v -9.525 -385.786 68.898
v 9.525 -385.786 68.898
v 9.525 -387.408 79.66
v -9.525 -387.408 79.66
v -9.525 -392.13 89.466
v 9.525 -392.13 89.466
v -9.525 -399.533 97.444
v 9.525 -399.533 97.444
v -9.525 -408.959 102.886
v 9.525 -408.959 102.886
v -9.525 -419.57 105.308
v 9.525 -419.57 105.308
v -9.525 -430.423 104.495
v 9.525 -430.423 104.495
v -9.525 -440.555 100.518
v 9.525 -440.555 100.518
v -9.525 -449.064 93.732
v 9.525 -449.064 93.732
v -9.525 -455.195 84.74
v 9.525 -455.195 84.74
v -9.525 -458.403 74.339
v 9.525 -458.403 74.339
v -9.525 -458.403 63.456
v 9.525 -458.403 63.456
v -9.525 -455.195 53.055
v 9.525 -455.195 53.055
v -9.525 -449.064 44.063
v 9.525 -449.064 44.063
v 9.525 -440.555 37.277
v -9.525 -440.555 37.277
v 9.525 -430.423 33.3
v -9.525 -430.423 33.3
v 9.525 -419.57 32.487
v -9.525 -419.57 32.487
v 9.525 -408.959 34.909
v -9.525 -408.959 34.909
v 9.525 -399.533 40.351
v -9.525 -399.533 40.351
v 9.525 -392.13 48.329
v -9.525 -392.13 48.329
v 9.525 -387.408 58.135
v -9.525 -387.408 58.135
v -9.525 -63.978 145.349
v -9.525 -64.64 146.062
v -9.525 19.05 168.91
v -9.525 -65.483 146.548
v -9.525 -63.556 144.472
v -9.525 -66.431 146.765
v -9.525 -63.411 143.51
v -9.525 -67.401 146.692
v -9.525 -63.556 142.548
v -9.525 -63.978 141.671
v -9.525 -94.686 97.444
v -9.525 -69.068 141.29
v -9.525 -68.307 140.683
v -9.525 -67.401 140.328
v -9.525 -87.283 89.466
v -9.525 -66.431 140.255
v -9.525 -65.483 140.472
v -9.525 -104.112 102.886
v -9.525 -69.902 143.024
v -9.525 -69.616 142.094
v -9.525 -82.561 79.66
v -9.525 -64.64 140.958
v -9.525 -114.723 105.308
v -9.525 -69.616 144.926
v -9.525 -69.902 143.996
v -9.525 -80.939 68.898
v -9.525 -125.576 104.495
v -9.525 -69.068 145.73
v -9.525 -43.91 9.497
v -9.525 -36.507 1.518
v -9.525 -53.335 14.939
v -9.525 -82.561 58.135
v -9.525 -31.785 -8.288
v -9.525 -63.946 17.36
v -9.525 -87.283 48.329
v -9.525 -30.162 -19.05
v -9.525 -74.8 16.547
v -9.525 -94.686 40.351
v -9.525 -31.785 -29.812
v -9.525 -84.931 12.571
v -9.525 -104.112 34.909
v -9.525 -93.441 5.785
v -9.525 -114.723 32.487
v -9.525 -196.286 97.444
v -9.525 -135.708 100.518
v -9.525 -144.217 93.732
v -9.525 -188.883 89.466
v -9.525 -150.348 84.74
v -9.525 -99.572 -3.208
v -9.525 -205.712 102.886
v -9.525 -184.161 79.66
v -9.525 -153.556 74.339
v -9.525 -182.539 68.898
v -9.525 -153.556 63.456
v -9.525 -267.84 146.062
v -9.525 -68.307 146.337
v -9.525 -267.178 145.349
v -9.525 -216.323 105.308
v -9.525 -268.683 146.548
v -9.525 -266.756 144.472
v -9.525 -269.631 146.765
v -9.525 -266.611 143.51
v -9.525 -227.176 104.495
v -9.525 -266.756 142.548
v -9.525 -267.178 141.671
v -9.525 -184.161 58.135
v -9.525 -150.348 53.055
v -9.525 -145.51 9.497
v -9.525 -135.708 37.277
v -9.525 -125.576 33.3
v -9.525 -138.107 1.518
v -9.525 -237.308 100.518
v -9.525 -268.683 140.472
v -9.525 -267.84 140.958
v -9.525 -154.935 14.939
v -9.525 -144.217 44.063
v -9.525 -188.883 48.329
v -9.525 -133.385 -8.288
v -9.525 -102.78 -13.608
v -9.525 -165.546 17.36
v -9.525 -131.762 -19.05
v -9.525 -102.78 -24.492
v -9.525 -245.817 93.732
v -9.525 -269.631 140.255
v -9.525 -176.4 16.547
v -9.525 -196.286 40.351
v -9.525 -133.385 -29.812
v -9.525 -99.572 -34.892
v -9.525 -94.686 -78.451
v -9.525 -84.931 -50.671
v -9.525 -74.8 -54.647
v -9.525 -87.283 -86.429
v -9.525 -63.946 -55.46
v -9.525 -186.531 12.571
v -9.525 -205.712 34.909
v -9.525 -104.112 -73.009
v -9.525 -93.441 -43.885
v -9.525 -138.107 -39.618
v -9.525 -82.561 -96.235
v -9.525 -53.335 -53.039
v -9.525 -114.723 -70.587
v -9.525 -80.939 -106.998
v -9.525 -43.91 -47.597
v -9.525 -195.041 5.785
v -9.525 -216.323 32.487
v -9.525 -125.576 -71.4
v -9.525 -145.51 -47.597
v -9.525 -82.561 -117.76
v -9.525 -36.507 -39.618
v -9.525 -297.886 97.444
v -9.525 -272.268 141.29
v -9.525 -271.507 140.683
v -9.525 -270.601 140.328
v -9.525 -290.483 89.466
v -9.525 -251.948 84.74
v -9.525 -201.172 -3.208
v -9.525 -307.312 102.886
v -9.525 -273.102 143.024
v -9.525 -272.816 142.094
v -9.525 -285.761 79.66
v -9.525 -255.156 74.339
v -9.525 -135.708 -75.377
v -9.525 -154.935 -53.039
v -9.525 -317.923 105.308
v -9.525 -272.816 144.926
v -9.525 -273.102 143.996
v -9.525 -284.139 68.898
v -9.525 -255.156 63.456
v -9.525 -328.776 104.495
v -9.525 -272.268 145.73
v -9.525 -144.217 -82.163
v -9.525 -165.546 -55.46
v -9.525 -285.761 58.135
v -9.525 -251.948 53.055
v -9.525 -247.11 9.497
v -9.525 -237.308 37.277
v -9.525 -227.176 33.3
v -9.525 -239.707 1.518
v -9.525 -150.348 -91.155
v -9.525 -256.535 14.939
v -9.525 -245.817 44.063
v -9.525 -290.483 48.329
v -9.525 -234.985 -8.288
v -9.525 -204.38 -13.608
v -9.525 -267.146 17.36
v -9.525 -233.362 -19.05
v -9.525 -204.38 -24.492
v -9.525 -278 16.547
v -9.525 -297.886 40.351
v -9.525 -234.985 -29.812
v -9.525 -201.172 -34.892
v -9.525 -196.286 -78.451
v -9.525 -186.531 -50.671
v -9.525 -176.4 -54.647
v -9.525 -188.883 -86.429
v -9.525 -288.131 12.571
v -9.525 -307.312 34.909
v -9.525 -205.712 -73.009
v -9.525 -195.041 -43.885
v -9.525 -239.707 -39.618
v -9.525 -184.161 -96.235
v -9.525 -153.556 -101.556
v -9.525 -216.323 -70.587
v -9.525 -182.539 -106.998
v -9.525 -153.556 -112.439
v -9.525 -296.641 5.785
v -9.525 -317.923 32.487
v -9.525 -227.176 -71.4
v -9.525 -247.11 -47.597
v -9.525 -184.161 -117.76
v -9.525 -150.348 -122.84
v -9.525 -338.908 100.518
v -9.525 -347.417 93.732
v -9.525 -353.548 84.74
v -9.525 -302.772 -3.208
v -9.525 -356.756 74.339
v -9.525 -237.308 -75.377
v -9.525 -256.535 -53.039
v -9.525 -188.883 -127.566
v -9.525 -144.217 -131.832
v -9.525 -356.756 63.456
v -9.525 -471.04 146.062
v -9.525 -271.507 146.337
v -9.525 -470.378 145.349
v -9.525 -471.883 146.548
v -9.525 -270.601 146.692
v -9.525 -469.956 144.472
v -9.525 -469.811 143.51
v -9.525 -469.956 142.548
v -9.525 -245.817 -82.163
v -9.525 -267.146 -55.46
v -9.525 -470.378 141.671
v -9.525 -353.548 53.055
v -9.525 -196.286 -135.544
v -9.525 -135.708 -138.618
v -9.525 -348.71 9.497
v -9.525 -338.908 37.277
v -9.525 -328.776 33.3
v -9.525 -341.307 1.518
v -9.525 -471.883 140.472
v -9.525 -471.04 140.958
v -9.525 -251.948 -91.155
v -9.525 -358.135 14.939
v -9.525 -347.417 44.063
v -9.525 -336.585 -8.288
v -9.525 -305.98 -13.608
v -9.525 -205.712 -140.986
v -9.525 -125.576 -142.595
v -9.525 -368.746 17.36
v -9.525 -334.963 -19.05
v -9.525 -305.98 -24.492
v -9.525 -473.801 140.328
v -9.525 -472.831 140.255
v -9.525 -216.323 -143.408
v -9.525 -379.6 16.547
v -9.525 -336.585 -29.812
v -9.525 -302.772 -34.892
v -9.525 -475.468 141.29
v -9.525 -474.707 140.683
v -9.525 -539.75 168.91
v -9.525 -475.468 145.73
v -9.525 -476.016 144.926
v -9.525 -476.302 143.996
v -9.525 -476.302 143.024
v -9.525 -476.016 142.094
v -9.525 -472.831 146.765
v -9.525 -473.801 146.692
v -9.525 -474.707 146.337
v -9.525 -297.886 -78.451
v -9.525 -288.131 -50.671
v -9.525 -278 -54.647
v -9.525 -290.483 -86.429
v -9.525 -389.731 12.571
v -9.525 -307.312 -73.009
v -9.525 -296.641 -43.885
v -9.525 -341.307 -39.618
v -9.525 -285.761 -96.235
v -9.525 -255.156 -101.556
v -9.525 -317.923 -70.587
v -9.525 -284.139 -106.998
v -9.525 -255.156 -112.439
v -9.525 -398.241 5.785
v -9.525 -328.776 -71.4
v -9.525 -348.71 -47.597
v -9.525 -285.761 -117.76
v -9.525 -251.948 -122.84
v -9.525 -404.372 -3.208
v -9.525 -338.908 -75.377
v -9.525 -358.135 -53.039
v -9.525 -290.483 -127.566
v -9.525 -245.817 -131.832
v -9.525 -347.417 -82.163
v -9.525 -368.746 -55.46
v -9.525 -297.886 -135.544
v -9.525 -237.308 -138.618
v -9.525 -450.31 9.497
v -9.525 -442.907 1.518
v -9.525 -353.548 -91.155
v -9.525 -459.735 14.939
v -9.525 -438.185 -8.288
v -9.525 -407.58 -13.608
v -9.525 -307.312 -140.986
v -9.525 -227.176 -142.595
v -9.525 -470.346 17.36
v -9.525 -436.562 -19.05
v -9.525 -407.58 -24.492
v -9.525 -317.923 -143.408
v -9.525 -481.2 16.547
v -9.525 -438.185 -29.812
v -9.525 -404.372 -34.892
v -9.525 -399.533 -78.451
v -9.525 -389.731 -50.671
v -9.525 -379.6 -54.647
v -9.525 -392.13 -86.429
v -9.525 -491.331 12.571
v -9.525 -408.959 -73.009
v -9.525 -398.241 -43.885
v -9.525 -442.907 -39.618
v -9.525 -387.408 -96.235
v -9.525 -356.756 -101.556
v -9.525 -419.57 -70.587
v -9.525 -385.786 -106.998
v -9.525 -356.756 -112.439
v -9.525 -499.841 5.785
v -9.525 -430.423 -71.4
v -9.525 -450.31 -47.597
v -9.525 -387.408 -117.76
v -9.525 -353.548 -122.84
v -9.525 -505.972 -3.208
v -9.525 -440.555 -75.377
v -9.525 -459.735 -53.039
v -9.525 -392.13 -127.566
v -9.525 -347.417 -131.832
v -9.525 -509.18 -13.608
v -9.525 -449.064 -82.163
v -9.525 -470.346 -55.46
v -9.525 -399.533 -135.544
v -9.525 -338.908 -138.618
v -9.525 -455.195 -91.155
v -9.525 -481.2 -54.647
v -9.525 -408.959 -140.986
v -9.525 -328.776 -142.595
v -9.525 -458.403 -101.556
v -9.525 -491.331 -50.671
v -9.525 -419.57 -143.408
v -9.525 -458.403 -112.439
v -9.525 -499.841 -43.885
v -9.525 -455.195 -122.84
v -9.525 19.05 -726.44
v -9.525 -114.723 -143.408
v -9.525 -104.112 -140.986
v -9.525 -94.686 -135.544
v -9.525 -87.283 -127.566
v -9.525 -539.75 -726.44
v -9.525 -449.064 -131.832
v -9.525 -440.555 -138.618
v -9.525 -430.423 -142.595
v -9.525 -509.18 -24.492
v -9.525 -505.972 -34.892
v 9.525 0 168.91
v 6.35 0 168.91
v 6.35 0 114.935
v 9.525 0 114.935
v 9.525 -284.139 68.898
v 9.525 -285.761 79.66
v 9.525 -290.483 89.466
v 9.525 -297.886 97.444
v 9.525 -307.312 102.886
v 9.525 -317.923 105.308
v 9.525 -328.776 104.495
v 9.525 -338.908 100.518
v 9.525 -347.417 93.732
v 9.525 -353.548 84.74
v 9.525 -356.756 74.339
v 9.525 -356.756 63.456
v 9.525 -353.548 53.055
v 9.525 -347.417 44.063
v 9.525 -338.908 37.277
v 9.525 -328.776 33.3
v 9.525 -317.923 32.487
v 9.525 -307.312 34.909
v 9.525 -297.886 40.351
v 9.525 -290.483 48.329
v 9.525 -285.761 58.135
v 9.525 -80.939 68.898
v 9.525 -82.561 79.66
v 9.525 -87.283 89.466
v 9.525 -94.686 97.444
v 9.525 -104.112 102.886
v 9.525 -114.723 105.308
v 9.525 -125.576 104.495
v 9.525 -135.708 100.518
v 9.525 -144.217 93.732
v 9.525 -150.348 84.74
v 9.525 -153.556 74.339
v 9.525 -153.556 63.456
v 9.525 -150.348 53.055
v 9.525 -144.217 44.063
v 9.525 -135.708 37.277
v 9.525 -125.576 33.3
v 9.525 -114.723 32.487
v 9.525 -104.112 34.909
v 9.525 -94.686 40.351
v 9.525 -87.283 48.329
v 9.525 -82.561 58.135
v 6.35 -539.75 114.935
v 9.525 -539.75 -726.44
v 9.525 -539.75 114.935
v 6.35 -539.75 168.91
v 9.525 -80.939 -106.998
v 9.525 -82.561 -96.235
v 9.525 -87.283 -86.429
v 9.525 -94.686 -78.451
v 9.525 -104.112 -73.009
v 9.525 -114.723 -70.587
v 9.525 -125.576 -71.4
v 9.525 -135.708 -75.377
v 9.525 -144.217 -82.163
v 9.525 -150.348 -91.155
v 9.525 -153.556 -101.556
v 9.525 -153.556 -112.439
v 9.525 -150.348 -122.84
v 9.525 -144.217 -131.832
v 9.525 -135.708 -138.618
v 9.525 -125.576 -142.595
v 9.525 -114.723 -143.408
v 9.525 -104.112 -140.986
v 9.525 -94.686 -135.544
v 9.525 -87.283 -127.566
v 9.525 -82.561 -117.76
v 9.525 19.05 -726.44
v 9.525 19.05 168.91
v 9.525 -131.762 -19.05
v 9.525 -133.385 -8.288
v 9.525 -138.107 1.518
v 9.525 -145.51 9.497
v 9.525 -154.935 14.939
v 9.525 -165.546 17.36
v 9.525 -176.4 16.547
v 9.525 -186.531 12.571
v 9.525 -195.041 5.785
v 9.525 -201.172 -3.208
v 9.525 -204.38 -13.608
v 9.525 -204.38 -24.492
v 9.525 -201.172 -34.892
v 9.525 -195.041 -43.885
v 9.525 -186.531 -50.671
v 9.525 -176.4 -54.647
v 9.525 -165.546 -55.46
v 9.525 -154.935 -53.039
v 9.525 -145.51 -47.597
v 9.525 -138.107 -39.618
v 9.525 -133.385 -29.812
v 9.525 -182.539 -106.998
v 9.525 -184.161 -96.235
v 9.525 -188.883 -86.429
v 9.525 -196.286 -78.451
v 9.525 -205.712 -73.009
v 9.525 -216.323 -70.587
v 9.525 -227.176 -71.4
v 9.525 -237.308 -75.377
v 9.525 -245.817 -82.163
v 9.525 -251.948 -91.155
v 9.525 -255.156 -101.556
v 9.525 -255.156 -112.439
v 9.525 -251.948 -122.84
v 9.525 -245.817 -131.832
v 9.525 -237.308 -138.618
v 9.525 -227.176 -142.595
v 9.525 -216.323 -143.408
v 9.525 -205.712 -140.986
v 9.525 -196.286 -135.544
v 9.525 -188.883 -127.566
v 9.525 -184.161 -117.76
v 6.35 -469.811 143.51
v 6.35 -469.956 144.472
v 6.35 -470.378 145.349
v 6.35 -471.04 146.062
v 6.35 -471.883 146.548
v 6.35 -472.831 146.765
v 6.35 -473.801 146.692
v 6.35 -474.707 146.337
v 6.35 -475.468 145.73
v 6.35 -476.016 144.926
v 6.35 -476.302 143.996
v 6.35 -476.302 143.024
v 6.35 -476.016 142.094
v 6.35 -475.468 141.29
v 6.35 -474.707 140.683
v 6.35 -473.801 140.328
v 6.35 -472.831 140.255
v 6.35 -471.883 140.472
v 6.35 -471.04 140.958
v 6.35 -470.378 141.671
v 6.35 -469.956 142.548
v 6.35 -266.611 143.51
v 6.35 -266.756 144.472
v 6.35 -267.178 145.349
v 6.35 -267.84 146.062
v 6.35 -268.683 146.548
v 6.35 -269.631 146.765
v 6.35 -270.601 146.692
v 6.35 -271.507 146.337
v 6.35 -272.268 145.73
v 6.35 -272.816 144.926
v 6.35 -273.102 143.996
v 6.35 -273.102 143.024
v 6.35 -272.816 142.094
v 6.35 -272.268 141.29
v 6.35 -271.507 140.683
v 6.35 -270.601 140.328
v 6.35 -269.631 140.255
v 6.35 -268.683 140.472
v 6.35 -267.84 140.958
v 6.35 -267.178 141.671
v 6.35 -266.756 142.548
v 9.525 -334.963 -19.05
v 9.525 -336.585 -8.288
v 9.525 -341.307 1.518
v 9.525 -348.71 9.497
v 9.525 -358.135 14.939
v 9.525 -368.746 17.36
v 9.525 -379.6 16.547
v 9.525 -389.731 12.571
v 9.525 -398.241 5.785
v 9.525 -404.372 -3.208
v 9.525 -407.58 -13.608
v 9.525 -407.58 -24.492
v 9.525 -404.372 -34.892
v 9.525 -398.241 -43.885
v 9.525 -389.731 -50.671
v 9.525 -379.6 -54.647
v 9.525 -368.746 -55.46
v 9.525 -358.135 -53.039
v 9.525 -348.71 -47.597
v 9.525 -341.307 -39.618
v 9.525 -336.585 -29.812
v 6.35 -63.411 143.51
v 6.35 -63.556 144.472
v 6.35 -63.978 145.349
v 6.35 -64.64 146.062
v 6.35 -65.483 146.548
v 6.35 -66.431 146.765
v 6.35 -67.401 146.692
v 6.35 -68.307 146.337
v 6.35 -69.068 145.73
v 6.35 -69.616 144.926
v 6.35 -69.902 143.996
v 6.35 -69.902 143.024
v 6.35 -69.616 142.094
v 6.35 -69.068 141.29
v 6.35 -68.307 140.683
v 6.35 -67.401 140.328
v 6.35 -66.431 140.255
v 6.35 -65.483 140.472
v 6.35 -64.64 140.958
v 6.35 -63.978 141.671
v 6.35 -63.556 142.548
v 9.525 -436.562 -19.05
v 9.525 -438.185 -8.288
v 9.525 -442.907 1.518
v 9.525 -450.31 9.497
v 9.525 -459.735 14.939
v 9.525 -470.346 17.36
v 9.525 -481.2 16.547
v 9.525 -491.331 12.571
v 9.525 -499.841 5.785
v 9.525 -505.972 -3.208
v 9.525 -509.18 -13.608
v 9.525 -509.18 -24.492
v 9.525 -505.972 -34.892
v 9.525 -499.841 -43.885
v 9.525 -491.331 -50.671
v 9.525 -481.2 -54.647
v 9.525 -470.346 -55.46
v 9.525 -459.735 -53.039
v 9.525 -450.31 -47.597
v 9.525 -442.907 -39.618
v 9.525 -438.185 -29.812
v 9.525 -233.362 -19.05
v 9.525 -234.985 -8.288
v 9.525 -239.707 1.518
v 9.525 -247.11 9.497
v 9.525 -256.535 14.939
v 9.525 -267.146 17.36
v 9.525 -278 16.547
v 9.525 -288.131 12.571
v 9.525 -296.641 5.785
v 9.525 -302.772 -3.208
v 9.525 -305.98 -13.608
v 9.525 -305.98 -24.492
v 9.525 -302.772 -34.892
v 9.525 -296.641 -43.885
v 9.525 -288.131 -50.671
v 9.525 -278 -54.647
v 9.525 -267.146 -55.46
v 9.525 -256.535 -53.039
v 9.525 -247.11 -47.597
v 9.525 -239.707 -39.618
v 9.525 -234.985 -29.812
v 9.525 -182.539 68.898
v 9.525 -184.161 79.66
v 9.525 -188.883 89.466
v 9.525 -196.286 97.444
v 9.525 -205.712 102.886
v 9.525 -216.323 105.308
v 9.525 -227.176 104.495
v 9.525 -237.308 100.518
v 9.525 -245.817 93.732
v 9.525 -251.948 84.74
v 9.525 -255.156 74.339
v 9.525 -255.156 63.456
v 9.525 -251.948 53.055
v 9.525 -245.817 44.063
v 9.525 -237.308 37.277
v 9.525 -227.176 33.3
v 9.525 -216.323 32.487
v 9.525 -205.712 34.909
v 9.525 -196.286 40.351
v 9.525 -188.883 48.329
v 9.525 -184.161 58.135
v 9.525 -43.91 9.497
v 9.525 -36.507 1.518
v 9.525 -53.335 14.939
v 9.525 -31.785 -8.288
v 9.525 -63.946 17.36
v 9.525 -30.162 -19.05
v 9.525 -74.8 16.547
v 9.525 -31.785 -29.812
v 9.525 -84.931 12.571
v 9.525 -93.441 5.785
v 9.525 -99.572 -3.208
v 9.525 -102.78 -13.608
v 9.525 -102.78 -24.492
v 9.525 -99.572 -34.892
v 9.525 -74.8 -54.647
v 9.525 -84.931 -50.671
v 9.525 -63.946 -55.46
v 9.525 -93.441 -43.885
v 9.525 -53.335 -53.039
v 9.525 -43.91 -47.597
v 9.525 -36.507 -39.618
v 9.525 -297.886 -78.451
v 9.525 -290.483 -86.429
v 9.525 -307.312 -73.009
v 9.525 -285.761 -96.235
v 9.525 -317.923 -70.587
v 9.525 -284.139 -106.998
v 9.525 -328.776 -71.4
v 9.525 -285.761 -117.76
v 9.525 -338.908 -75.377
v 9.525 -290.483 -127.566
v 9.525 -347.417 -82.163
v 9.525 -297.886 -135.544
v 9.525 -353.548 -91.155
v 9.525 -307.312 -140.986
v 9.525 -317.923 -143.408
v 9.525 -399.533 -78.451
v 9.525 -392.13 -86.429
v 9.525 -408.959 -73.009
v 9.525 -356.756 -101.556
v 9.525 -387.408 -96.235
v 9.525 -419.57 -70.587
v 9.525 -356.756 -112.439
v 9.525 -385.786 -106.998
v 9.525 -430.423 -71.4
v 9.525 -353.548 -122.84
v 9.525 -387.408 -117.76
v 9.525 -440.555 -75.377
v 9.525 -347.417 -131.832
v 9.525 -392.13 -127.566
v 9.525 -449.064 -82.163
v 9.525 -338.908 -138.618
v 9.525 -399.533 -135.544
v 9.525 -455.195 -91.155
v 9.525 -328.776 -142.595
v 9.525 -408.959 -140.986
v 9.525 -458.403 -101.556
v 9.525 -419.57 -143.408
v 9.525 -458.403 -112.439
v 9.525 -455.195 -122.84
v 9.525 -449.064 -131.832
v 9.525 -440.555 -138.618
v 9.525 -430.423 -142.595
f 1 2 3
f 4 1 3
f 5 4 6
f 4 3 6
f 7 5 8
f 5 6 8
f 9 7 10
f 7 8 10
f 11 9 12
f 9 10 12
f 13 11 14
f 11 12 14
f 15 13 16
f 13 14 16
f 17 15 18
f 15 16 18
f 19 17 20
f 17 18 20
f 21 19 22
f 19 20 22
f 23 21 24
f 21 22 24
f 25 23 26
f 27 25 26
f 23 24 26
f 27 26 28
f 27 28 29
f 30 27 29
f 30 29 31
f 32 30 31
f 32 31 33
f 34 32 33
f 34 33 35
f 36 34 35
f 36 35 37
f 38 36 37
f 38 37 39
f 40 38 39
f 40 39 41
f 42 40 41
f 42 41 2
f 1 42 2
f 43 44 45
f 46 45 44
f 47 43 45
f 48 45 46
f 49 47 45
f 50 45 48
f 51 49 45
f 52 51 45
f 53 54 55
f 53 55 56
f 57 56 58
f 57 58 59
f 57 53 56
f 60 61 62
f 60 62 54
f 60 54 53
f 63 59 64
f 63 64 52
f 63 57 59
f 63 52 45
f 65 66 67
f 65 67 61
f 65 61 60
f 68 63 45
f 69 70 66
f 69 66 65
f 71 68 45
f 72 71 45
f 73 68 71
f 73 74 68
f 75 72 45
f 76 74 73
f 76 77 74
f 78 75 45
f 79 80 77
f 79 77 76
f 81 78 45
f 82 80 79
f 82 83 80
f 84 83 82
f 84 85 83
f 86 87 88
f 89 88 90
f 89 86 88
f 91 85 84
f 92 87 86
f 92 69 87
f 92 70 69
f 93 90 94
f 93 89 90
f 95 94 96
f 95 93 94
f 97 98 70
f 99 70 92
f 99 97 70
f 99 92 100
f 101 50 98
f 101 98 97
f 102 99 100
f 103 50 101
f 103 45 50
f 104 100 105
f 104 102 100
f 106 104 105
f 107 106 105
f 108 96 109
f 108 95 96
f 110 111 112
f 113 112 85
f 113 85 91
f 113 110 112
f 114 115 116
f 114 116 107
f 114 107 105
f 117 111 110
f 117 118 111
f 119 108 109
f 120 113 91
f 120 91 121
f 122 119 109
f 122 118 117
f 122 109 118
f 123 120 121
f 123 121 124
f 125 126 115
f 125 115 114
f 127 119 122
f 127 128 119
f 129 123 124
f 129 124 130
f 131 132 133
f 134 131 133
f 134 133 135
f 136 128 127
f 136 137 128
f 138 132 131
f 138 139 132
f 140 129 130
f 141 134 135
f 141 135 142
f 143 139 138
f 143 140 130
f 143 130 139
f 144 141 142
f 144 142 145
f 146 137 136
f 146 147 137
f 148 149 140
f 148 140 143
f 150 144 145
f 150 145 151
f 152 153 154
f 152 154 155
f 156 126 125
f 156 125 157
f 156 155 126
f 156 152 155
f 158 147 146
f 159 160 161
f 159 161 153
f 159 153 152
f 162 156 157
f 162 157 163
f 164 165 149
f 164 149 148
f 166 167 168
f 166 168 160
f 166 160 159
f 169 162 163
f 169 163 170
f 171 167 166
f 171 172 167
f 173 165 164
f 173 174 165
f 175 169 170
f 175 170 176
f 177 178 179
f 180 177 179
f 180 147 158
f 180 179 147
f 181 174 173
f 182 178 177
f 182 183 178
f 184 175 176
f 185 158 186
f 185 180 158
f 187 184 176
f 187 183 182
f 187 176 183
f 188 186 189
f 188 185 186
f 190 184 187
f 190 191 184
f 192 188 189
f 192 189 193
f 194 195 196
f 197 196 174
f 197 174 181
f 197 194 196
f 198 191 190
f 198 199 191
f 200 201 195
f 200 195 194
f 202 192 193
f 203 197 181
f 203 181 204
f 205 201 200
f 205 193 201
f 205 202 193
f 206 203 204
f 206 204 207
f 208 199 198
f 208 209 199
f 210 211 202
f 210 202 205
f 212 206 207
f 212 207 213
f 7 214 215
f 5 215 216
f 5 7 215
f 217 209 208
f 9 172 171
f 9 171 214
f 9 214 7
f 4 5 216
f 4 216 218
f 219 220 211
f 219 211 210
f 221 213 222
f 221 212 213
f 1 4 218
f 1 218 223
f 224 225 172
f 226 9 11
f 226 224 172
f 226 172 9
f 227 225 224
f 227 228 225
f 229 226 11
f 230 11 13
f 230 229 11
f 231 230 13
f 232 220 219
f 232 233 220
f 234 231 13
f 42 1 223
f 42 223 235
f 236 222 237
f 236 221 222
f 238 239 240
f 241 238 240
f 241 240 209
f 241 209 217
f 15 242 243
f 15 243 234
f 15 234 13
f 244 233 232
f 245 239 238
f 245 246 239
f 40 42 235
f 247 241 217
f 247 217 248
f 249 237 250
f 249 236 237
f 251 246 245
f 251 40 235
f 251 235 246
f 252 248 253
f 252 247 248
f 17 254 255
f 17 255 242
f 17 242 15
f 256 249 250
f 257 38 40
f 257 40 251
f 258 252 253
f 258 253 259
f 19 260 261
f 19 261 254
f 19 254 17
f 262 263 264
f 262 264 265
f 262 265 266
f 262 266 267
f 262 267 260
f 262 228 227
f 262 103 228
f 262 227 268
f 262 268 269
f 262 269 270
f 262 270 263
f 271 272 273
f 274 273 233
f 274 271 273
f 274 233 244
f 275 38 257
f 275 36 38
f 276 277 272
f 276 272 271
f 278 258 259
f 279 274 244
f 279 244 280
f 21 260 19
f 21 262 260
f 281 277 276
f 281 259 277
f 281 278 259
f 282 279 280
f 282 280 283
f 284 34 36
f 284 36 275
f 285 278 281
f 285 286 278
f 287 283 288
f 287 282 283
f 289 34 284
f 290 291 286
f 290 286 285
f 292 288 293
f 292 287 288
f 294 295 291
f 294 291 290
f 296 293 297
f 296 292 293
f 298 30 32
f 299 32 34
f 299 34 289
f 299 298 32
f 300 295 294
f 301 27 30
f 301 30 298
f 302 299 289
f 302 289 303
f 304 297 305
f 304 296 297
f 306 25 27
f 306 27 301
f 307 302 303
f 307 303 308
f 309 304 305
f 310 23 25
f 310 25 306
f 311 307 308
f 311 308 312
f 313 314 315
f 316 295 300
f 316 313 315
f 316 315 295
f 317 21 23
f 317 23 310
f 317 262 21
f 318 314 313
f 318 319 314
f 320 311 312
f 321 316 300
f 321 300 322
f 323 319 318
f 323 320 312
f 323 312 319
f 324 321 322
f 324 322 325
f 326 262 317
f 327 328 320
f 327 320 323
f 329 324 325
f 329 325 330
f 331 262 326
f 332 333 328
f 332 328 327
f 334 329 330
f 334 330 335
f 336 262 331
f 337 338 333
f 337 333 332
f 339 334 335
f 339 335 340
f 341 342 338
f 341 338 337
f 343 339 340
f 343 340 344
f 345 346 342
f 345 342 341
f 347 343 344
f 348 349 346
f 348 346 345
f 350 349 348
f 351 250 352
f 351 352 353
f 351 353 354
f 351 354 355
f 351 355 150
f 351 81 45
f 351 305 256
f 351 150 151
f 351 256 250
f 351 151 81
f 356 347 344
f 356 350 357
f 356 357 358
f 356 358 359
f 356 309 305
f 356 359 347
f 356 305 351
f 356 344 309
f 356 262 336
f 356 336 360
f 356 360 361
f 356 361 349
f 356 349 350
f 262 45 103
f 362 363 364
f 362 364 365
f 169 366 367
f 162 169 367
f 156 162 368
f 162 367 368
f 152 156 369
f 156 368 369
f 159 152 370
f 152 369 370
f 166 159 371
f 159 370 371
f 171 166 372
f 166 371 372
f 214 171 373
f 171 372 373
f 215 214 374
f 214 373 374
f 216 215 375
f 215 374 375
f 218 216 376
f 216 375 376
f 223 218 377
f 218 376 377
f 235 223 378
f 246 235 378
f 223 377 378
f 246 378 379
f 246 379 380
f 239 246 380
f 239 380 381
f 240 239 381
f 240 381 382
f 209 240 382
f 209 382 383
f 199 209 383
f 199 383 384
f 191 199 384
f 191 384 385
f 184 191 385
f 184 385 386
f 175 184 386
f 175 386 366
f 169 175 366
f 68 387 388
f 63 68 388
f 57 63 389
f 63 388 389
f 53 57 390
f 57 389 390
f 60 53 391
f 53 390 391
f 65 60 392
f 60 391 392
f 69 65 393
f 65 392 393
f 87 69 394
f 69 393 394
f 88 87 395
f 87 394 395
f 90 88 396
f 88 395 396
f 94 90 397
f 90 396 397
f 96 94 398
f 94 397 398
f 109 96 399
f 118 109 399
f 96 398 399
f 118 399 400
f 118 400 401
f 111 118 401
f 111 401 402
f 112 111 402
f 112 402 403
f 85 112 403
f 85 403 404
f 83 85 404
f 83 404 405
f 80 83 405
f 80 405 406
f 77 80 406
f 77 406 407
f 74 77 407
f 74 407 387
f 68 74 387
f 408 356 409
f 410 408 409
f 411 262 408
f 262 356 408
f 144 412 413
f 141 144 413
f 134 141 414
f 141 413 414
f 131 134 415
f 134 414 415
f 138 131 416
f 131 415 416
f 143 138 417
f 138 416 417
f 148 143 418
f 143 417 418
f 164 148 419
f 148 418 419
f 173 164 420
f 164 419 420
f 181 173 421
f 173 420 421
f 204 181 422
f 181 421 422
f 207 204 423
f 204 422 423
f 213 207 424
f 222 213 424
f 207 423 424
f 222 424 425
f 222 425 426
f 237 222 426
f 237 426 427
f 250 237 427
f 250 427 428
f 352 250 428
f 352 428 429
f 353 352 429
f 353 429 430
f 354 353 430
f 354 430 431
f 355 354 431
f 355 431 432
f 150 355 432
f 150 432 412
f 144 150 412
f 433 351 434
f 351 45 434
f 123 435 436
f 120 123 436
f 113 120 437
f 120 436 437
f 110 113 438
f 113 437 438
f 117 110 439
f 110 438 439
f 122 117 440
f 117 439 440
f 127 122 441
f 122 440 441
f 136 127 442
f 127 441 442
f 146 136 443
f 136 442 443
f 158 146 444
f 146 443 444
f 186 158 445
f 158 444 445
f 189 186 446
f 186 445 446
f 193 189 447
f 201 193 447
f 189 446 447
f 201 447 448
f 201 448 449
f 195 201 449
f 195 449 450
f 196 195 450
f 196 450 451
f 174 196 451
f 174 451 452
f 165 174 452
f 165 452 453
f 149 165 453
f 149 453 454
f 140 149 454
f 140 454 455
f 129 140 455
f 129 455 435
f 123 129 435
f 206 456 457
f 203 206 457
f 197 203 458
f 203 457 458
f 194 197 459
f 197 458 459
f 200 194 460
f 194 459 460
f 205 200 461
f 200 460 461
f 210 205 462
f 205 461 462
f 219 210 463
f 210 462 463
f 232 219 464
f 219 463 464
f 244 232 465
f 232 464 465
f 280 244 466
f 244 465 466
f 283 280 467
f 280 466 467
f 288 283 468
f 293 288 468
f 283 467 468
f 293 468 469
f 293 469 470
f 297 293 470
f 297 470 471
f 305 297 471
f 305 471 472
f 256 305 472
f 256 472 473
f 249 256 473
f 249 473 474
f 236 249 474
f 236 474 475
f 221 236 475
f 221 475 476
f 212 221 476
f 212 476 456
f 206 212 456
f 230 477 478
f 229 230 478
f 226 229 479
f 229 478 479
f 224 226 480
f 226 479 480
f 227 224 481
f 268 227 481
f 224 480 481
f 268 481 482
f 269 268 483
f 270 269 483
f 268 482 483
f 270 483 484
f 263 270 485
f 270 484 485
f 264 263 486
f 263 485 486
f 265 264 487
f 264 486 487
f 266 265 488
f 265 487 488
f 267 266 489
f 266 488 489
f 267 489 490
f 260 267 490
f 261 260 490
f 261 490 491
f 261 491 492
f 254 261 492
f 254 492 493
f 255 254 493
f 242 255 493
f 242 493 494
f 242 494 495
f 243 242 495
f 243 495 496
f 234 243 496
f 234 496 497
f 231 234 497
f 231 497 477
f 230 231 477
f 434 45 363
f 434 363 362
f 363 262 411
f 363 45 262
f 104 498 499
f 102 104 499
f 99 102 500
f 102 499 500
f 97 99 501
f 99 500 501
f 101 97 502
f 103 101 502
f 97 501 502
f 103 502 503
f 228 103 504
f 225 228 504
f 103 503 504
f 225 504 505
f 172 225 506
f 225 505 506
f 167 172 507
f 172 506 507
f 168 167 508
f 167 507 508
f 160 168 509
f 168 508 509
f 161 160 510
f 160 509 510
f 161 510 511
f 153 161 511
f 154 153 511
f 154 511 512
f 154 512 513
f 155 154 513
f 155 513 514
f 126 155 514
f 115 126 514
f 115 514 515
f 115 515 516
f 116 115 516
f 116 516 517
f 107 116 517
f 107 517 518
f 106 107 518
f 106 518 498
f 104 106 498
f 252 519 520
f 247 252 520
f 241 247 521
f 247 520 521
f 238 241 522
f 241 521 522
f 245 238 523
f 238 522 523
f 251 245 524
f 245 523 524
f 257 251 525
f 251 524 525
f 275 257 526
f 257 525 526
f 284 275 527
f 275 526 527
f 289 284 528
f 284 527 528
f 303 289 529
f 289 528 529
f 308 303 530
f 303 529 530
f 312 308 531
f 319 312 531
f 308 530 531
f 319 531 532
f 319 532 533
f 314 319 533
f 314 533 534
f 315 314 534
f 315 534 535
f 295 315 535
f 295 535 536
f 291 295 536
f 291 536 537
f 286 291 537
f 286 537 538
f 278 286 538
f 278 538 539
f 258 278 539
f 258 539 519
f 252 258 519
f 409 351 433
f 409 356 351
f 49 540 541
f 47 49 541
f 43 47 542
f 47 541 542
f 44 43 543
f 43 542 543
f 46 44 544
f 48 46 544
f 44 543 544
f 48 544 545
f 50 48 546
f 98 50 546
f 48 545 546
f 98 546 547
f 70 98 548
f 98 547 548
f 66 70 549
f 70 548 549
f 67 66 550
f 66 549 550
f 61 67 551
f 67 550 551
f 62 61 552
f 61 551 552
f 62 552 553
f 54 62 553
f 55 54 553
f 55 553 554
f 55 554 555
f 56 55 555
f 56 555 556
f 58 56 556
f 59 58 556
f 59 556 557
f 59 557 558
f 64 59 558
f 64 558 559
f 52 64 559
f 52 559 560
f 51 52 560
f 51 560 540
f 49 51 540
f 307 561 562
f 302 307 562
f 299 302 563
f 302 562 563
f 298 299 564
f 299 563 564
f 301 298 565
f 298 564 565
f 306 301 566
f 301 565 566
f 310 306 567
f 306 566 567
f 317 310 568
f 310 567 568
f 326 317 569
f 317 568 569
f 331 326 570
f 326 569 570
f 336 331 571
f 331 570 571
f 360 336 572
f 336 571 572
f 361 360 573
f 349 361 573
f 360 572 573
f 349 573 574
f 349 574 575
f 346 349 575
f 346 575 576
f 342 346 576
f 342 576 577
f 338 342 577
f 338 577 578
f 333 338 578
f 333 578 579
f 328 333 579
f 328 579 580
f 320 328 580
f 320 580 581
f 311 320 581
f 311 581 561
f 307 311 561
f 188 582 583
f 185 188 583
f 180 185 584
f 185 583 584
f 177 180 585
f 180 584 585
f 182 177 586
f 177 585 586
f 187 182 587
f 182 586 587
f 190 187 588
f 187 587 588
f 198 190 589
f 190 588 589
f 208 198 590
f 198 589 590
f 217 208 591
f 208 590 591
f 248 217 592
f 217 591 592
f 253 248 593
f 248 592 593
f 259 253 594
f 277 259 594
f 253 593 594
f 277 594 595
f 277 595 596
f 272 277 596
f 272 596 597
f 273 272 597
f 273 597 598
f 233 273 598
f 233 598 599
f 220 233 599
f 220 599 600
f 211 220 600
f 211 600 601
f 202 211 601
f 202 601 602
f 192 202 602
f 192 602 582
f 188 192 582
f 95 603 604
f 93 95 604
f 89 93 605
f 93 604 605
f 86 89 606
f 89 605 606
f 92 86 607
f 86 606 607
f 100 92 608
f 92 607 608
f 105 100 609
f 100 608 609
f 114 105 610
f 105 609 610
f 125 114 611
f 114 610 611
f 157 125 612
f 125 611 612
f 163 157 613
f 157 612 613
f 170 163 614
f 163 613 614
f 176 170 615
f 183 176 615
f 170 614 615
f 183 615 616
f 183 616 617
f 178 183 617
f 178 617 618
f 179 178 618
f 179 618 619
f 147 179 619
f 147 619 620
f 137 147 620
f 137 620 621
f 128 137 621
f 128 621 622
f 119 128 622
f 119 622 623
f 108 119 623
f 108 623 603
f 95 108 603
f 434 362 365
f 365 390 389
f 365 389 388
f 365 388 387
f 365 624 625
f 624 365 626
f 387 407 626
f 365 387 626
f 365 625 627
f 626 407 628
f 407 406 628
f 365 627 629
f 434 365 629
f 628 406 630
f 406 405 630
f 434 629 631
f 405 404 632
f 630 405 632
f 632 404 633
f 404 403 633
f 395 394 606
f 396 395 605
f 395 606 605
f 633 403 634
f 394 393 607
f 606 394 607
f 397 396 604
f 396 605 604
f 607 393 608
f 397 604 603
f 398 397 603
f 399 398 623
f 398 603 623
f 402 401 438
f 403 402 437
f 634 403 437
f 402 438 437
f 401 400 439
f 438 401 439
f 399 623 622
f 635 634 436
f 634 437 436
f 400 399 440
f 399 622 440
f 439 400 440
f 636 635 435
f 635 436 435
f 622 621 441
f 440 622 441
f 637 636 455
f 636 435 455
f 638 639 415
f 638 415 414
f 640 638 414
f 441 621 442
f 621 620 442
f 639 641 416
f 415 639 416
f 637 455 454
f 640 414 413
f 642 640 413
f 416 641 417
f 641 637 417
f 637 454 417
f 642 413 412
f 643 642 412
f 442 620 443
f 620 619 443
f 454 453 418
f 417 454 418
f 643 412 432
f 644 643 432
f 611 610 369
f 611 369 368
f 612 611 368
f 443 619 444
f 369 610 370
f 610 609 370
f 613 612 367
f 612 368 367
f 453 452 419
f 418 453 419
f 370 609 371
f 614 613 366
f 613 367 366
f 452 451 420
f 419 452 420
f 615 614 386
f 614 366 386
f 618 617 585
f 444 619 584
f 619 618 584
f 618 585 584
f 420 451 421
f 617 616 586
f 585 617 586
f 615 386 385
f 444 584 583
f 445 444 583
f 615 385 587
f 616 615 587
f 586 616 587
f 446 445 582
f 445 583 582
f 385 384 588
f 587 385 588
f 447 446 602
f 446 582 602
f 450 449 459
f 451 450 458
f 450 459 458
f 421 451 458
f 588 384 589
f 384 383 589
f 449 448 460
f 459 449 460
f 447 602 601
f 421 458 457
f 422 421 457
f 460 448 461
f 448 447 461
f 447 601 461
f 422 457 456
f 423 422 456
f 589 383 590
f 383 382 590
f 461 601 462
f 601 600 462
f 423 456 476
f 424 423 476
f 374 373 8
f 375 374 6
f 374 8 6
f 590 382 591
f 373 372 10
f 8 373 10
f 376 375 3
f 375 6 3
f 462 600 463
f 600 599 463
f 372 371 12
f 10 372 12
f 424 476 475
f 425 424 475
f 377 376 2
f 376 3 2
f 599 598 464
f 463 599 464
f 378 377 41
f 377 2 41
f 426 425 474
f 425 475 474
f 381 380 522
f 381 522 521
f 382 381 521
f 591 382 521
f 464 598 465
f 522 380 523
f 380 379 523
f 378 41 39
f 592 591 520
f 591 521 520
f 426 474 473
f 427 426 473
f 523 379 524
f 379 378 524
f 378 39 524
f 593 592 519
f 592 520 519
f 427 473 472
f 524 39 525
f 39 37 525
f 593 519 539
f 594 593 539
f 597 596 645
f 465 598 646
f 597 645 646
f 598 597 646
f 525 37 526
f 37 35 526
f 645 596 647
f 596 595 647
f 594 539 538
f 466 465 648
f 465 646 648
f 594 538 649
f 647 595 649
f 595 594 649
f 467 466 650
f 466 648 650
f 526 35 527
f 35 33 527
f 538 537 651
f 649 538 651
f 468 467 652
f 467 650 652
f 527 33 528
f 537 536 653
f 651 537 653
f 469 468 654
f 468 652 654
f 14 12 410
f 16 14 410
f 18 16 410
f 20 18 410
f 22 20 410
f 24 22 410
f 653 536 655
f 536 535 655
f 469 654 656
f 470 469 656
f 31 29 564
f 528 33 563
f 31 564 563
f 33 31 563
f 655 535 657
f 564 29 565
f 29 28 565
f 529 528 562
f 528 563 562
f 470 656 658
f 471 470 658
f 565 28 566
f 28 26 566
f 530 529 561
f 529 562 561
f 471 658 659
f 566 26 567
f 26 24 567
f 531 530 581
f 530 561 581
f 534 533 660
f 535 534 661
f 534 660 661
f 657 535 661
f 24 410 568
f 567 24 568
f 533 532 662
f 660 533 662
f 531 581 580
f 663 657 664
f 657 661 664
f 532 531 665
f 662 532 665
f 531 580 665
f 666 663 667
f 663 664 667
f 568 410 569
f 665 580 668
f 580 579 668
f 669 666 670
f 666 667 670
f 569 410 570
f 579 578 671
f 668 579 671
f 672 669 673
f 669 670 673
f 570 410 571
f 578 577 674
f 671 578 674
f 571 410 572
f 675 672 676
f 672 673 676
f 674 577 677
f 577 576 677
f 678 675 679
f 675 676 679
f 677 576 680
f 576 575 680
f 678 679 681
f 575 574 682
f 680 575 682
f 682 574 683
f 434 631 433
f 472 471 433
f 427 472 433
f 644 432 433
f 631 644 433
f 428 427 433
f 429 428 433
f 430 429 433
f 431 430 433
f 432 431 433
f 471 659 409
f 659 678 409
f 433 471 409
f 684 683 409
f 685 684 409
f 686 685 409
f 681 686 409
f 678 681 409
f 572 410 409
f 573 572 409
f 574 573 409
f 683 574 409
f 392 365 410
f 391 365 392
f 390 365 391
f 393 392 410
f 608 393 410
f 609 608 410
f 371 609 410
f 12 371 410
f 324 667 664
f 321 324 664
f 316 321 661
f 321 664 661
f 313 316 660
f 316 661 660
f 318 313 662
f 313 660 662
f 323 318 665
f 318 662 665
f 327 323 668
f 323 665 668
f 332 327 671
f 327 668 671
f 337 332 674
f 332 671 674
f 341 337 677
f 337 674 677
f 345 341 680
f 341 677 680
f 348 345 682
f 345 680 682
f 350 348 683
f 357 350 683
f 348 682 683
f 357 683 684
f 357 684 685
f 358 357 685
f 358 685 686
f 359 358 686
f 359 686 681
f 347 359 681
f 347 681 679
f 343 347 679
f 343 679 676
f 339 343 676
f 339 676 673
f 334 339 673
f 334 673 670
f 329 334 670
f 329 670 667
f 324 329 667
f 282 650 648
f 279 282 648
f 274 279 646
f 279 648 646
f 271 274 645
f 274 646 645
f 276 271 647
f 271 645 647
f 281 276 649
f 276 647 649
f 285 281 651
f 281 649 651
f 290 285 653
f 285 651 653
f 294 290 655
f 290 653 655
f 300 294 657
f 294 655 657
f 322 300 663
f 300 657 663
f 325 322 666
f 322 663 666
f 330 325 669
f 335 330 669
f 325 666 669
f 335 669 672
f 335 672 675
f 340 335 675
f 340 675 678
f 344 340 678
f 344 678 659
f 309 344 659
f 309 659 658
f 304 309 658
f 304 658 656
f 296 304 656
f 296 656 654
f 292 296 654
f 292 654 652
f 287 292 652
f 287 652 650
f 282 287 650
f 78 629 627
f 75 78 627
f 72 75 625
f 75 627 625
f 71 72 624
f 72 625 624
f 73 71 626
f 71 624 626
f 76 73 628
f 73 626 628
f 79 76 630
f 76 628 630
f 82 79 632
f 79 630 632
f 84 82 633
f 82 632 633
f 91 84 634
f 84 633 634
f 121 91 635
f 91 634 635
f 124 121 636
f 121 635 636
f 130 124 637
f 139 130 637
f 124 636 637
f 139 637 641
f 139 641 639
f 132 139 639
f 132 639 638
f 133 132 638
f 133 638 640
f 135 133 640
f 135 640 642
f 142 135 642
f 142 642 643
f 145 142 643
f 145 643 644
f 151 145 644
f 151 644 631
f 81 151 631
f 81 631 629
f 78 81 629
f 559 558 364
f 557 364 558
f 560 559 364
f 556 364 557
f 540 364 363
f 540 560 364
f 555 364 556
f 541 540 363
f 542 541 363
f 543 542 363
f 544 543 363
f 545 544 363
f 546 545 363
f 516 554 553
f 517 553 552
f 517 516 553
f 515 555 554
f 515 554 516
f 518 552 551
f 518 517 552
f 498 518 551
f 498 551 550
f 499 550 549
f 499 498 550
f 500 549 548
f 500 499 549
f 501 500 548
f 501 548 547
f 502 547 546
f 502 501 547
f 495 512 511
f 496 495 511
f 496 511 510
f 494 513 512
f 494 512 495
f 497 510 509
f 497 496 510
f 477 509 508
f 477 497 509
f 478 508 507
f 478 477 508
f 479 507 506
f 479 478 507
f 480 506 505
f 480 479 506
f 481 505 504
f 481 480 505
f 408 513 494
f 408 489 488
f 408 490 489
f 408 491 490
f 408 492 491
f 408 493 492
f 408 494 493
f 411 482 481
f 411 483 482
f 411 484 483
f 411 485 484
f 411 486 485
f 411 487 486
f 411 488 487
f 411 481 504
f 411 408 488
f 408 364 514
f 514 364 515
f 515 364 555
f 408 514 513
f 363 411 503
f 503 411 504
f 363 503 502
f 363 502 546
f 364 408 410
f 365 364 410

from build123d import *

# Parameters (mm, degrees)
F0_W     = 19.05
F0_H     = 337.82
F1_DEPTH = 539.75
F2_R     = 36.5125
F3_DEPTH = 25.4
F4_DEPTH = 557.53
F5_DEPTH = 19.05
F6_W     = 3.175
F6_H     = 53.975
F7_DEPTH = 539.75
F9_D     = 6.5278


# Not quite as in the source:
# - a feature names something its author has since deleted; it is built from what else it names


with BuildPart() as f1:
    # F0 (on Front) → F1 (new body)
    with BuildSketch(Plane.XZ):
        Rectangle(F0_W, F0_H)
    extrude(amount=F1_DEPTH)

    # F2 (on face) → F3 (cut)
    with BuildSketch(Plane.YZ.offset(9.525)):
        with Locations((-269.875, -19.05)):
            Circle(F2_R)
        with Locations((-320.6515127996, 68.8975)):
            Circle(F2_R)
        with Locations((-219.0515127996, 68.8975)):
            Circle(F2_R)
        with Locations((-168.275, -19.05)):
            Circle(F2_R)
        with Locations((-117.4515127996, 68.8975)):
            Circle(F2_R)
        with Locations((-66.675, -19.05)):
            Circle(F2_R)
        with Locations((-371.475, -19.05)):
            Circle(F2_R)
        with Locations((-422.2984872004, 68.8975)):
            Circle(F2_R)
        with Locations((-473.075, -19.05)):
            Circle(F2_R)
        with Locations((-422.2984872004, -106.9975)):
            Circle(F2_R)
        with Locations((-320.6515127996, -106.9975)):
            Circle(F2_R)
        with Locations((-219.0515127996, -106.9975)):
            Circle(F2_R)
        with Locations((-117.4515127996, -106.9975)):
            Circle(F2_R)
    extrude(amount=-F3_DEPTH, mode=Mode.SUBTRACT)

    # F4 (add): a face of the model
    f4_faces = [f1.faces().sort_by_distance(p)[0] for p in [
        (0, -269.875, -168.91),
    ]]
    extrude(f4_faces, amount=F4_DEPTH)

    # F5 (add): a face of the model
    f5_faces = [f1.faces().sort_by_distance(p)[0] for p in [
        (0, 0, -278.765),
    ]]
    extrude(f5_faces, amount=F5_DEPTH)

    # F6 (on face) → F7 (cut, through all)
    with BuildSketch(Plane.XZ.offset(539.75)):
        with Locations((7.9375, 141.9225)):
            Rectangle(F6_W, F6_H)
    extrude(amount=-F7_DEPTH, mode=Mode.SUBTRACT)

    # F9 (through all)
    with Locations(Plane(origin=(-9.525, 0, 0), x_dir=(0, -1, 0), z_dir=(-1, 0, 0))):
        with Locations((66.675, 143.51), (269.875, 143.51), (473.075, 143.51)):
            Hole(F9_D / 2)


solid = f1.part
